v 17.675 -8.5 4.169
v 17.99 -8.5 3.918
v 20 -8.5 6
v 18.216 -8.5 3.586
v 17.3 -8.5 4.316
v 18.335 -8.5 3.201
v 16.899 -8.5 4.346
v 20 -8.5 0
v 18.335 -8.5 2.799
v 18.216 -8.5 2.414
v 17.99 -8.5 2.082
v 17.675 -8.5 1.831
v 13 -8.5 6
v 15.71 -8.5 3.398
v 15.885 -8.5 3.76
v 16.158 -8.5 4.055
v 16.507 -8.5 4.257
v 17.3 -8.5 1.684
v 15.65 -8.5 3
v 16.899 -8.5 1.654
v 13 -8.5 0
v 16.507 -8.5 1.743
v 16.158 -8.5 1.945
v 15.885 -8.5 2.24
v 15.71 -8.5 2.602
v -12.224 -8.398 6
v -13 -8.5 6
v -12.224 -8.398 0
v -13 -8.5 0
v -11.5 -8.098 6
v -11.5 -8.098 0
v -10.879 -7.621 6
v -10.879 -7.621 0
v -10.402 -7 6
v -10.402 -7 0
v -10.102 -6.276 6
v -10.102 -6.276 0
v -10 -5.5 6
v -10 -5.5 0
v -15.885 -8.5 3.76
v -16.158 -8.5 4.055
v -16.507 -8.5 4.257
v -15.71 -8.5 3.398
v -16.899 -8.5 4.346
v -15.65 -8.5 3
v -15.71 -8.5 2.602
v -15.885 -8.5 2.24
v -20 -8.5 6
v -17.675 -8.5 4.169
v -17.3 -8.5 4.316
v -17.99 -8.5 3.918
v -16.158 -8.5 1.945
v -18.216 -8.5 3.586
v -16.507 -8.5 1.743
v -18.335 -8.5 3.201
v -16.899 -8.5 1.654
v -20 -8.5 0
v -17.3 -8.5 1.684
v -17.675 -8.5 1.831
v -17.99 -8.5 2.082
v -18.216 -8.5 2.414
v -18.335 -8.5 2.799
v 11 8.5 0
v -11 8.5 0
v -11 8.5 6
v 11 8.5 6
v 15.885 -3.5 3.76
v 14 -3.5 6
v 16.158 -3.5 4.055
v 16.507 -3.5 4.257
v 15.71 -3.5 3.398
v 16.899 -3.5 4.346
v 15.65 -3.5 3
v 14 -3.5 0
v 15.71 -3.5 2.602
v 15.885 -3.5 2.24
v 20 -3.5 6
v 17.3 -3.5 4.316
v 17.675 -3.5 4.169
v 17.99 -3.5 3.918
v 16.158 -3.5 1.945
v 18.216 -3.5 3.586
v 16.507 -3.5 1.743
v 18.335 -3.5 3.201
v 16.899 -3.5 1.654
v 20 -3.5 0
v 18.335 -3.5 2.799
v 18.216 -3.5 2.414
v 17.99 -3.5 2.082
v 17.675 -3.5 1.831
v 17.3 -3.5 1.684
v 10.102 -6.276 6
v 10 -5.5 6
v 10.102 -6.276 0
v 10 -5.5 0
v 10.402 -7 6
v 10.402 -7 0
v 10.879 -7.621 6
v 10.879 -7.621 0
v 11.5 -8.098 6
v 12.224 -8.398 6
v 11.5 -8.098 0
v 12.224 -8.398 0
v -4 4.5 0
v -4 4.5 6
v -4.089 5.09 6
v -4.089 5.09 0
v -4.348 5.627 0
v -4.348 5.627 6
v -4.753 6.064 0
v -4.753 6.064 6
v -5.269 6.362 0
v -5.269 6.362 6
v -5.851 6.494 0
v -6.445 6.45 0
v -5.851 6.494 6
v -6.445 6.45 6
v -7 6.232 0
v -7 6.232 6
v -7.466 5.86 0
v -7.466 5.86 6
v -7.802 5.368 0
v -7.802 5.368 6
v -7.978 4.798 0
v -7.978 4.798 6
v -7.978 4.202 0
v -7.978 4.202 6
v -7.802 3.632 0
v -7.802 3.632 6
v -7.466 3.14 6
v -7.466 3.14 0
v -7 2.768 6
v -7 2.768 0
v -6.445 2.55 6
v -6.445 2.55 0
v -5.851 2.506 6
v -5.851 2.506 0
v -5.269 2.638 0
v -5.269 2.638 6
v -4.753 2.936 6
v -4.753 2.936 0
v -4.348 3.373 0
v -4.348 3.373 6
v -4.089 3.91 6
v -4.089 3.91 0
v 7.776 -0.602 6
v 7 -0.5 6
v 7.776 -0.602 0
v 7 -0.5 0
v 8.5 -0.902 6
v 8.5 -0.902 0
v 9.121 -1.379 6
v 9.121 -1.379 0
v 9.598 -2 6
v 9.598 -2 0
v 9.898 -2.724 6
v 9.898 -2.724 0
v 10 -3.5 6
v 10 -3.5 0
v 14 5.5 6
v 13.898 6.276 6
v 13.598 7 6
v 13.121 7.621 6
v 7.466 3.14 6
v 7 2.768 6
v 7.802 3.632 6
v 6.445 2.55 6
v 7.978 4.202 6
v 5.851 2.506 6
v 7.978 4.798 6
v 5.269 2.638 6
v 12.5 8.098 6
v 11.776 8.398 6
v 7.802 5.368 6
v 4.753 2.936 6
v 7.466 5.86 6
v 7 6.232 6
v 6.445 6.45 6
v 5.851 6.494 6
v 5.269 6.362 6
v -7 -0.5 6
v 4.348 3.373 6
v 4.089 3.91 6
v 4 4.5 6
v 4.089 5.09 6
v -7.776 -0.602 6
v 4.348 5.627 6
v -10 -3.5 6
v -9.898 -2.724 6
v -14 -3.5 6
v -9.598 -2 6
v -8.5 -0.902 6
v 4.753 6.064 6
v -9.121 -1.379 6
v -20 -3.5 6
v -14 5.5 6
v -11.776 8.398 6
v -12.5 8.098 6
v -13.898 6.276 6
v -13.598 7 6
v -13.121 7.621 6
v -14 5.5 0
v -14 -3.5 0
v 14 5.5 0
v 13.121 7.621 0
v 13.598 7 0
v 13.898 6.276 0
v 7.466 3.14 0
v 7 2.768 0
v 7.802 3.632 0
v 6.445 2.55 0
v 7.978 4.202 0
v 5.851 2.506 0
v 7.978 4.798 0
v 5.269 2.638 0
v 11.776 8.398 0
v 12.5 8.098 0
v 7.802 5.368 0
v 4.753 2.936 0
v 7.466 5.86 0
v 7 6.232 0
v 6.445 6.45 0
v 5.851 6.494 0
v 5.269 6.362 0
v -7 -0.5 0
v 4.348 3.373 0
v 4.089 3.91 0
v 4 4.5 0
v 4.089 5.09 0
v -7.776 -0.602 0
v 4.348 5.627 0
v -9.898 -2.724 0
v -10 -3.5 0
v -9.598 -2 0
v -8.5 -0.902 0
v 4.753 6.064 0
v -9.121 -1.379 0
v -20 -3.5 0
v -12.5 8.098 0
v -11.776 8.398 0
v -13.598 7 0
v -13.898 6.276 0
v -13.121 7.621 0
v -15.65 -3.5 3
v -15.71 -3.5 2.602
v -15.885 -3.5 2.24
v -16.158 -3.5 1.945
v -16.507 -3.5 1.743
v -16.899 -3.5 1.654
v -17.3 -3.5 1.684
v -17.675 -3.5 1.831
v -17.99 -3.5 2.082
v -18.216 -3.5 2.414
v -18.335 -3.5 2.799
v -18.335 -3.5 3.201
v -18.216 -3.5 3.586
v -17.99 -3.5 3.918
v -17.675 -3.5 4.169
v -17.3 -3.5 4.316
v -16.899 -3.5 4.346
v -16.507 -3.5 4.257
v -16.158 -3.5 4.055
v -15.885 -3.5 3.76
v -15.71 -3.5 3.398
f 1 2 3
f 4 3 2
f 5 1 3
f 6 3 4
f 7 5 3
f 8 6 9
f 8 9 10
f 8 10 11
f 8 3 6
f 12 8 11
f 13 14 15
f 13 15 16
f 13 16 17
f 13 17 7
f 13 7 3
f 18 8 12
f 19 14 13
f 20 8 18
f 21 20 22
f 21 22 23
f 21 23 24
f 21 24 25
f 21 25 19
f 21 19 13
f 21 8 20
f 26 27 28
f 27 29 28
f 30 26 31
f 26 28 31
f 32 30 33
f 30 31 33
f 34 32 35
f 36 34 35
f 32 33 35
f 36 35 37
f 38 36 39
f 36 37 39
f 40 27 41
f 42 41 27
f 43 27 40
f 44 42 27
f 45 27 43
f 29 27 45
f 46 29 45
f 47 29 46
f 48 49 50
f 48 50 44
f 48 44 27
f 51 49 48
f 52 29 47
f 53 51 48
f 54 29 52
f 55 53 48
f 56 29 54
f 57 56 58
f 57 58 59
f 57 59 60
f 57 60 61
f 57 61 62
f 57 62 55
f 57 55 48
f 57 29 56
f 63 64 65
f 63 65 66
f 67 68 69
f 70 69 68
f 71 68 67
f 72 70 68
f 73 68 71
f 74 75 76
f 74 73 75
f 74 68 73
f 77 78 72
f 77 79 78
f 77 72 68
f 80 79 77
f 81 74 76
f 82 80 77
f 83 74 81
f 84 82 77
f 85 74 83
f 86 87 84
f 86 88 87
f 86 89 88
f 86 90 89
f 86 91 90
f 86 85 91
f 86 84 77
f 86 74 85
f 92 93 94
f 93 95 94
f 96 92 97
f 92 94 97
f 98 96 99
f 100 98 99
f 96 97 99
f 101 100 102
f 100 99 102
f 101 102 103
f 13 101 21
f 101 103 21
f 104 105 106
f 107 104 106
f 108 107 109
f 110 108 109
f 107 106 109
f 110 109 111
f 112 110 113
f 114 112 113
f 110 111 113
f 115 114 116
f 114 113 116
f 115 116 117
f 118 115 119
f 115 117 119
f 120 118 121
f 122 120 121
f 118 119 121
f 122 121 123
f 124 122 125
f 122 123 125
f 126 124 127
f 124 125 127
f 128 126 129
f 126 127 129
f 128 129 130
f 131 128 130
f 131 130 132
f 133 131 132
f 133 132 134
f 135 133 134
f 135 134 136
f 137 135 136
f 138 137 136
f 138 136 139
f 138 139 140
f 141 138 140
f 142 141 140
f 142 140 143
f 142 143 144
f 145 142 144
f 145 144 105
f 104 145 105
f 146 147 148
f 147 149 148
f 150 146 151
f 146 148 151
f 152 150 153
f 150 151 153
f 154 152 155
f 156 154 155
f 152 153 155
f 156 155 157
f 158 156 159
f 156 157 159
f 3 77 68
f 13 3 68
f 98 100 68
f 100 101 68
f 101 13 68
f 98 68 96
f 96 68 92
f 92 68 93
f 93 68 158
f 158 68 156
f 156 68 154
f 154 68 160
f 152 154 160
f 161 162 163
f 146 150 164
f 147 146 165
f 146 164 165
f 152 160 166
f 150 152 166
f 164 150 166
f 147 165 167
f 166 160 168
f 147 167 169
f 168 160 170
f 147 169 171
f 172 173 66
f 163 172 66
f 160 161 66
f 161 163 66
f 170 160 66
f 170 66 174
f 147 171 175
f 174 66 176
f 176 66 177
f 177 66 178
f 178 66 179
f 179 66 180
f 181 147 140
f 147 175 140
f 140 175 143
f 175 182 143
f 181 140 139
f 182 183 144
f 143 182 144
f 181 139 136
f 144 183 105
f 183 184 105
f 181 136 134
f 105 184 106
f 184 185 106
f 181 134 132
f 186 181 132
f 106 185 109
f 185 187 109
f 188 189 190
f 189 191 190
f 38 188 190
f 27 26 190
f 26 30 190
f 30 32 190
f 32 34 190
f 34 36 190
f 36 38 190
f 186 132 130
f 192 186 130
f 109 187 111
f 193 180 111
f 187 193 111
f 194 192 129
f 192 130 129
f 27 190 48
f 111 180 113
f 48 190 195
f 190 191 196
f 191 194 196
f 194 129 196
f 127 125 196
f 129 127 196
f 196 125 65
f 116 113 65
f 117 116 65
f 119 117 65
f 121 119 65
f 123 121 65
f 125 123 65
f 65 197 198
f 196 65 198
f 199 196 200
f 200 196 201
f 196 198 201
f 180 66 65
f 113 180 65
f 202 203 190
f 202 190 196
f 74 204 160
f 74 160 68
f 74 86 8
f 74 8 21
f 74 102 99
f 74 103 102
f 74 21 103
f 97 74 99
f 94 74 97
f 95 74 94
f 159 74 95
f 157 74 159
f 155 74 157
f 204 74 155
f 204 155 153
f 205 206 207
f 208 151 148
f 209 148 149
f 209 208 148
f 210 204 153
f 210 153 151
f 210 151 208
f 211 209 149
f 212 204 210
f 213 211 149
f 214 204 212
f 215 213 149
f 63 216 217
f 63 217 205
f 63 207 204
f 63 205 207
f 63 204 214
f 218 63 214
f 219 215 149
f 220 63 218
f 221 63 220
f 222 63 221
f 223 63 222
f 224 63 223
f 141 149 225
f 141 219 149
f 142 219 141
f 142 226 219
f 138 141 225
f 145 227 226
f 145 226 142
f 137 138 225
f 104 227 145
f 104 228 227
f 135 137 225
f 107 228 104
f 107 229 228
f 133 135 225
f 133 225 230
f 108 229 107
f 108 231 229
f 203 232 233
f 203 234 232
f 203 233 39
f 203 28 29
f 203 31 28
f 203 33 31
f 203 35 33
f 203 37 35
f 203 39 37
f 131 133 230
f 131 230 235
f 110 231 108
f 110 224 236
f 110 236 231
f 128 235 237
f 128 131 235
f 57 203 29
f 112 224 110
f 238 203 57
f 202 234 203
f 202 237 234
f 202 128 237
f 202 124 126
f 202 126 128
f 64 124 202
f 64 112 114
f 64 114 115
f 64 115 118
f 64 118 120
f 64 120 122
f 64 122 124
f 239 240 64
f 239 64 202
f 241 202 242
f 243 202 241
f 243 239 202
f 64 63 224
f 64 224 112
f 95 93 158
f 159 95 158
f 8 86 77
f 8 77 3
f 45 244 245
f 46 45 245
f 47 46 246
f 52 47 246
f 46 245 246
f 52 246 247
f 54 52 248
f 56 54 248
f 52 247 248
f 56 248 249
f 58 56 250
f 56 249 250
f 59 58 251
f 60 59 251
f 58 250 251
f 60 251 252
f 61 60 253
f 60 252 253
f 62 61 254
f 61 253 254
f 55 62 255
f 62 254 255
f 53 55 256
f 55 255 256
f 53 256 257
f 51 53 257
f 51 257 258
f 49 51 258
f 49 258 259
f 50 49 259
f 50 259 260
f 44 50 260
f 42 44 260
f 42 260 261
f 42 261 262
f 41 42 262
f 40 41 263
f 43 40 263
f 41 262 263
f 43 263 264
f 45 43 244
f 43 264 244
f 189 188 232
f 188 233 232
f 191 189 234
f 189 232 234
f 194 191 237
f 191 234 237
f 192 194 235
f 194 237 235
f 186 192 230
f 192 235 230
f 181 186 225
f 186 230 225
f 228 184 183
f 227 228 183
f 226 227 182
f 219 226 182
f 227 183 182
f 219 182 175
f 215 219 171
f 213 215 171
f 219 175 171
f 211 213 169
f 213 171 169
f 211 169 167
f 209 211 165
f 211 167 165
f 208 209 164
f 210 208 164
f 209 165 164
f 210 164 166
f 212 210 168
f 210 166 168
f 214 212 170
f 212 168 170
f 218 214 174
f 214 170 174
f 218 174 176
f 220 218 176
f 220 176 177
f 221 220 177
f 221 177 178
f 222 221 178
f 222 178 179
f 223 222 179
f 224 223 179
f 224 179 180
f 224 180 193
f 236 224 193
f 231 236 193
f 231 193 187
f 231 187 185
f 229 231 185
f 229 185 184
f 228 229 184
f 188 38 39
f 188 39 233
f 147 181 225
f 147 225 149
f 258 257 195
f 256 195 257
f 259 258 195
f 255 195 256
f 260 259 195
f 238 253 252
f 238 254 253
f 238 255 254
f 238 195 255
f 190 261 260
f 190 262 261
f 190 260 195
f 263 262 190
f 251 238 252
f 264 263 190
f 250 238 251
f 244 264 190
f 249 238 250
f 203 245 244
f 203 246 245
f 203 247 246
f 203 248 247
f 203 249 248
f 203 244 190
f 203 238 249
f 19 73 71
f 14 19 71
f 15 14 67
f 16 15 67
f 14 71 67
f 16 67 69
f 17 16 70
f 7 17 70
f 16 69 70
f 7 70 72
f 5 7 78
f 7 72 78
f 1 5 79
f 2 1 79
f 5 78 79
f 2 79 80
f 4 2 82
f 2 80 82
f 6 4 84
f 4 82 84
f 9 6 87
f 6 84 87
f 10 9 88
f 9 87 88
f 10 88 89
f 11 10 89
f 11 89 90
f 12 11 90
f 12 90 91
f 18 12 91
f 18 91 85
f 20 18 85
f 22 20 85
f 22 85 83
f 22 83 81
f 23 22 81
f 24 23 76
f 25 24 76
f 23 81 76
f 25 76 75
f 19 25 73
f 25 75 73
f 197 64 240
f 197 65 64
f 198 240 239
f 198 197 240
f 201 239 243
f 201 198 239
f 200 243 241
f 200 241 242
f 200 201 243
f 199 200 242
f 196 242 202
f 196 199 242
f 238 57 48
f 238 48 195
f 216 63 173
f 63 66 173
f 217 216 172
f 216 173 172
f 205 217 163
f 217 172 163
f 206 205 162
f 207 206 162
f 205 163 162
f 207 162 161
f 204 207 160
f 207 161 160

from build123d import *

# Parameters (mm, degrees)
SKETCH_1_W          = 18
SKETCH_1_H          = 17
EXTRUDE_1_DEPTH     = 6
EXTRUDE_2_DEPTH     = 6
SKETCH_8_R          = 1.35
CUT_EXTRUDE_4_DEPTH = 5
SKETCH_9_R          = 2
CUT_EXTRUDE_5_DEPTH = 10
SKETCH_10_W         = 20
SKETCH_10_H         = 8
CUT_EXTRUDE_6_DEPTH = 10
FILLET_1_R          = 3


with BuildPart() as part:
    # 草图1 → 凸台-拉伸1 (new body)
    with BuildSketch(Plane.XY):
        Rectangle(SKETCH_1_W, SKETCH_1_H)
    extrude(amount=EXTRUDE_1_DEPTH)

    # 草图6 → 凸台-拉伸2 (add)
    with BuildSketch(Plane(origin=(0, 0, 0), x_dir=(-1, 0, 0), z_dir=(0, 0, -1))):
        Polygon((-9, 8.5), (-14, 8.5), (-14, -3.5), (-20, -3.5), (-20, -8.5), (-9, -8.5), align=None)
        Polygon((20, -8.5), (20, -3.5), (14, -3.5), (14, 8.5), (9, 8.5), (9, -8.5), align=None)
    extrude(amount=-EXTRUDE_2_DEPTH)

    # 草图8 → 切除-拉伸4 (cut)
    with BuildSketch(Plane(origin=(0, -3.5, 0), x_dir=(1, 0, 0), z_dir=(0, 1, 0))):
        with Locations(Location((17, -3, 0), (0, 0, 180))):
            Circle(SKETCH_8_R)
        with Locations((-17, -3)):
            Circle(SKETCH_8_R)
    extrude(amount=-CUT_EXTRUDE_4_DEPTH, mode=Mode.SUBTRACT)

    # 草图9 → 切除-拉伸5 (cut)
    with BuildSketch(Plane.XY.offset(6)):
        with Locations((-6, 4.5)):
            Circle(SKETCH_9_R)
        with Locations(Location((6, 4.5, 0), (0, 0, 180))):
            Circle(SKETCH_9_R)
    extrude(amount=-CUT_EXTRUDE_5_DEPTH, mode=Mode.SUBTRACT)

    # 草图10 → 切除-拉伸6 (cut)
    with BuildSketch(Plane.XY.offset(6)):
        with Locations((0, -4.5)):
            Rectangle(SKETCH_10_W, SKETCH_10_H)
    extrude(amount=-CUT_EXTRUDE_6_DEPTH, mode=Mode.SUBTRACT)

    # 圆角1
    fillet_1_edges = [part.edges().sort_by_distance(p)[0] for p in [
        (14, 8.5, 3),
        (-14, 8.5, 3),
        (-10, -8.5, 3),
        (-10, -0.5, 3),
        (10, -0.5, 3),
        (10, -8.5, 3),
    ]]
    fillet(fillet_1_edges, radius=FILLET_1_R)


solid = part.part
